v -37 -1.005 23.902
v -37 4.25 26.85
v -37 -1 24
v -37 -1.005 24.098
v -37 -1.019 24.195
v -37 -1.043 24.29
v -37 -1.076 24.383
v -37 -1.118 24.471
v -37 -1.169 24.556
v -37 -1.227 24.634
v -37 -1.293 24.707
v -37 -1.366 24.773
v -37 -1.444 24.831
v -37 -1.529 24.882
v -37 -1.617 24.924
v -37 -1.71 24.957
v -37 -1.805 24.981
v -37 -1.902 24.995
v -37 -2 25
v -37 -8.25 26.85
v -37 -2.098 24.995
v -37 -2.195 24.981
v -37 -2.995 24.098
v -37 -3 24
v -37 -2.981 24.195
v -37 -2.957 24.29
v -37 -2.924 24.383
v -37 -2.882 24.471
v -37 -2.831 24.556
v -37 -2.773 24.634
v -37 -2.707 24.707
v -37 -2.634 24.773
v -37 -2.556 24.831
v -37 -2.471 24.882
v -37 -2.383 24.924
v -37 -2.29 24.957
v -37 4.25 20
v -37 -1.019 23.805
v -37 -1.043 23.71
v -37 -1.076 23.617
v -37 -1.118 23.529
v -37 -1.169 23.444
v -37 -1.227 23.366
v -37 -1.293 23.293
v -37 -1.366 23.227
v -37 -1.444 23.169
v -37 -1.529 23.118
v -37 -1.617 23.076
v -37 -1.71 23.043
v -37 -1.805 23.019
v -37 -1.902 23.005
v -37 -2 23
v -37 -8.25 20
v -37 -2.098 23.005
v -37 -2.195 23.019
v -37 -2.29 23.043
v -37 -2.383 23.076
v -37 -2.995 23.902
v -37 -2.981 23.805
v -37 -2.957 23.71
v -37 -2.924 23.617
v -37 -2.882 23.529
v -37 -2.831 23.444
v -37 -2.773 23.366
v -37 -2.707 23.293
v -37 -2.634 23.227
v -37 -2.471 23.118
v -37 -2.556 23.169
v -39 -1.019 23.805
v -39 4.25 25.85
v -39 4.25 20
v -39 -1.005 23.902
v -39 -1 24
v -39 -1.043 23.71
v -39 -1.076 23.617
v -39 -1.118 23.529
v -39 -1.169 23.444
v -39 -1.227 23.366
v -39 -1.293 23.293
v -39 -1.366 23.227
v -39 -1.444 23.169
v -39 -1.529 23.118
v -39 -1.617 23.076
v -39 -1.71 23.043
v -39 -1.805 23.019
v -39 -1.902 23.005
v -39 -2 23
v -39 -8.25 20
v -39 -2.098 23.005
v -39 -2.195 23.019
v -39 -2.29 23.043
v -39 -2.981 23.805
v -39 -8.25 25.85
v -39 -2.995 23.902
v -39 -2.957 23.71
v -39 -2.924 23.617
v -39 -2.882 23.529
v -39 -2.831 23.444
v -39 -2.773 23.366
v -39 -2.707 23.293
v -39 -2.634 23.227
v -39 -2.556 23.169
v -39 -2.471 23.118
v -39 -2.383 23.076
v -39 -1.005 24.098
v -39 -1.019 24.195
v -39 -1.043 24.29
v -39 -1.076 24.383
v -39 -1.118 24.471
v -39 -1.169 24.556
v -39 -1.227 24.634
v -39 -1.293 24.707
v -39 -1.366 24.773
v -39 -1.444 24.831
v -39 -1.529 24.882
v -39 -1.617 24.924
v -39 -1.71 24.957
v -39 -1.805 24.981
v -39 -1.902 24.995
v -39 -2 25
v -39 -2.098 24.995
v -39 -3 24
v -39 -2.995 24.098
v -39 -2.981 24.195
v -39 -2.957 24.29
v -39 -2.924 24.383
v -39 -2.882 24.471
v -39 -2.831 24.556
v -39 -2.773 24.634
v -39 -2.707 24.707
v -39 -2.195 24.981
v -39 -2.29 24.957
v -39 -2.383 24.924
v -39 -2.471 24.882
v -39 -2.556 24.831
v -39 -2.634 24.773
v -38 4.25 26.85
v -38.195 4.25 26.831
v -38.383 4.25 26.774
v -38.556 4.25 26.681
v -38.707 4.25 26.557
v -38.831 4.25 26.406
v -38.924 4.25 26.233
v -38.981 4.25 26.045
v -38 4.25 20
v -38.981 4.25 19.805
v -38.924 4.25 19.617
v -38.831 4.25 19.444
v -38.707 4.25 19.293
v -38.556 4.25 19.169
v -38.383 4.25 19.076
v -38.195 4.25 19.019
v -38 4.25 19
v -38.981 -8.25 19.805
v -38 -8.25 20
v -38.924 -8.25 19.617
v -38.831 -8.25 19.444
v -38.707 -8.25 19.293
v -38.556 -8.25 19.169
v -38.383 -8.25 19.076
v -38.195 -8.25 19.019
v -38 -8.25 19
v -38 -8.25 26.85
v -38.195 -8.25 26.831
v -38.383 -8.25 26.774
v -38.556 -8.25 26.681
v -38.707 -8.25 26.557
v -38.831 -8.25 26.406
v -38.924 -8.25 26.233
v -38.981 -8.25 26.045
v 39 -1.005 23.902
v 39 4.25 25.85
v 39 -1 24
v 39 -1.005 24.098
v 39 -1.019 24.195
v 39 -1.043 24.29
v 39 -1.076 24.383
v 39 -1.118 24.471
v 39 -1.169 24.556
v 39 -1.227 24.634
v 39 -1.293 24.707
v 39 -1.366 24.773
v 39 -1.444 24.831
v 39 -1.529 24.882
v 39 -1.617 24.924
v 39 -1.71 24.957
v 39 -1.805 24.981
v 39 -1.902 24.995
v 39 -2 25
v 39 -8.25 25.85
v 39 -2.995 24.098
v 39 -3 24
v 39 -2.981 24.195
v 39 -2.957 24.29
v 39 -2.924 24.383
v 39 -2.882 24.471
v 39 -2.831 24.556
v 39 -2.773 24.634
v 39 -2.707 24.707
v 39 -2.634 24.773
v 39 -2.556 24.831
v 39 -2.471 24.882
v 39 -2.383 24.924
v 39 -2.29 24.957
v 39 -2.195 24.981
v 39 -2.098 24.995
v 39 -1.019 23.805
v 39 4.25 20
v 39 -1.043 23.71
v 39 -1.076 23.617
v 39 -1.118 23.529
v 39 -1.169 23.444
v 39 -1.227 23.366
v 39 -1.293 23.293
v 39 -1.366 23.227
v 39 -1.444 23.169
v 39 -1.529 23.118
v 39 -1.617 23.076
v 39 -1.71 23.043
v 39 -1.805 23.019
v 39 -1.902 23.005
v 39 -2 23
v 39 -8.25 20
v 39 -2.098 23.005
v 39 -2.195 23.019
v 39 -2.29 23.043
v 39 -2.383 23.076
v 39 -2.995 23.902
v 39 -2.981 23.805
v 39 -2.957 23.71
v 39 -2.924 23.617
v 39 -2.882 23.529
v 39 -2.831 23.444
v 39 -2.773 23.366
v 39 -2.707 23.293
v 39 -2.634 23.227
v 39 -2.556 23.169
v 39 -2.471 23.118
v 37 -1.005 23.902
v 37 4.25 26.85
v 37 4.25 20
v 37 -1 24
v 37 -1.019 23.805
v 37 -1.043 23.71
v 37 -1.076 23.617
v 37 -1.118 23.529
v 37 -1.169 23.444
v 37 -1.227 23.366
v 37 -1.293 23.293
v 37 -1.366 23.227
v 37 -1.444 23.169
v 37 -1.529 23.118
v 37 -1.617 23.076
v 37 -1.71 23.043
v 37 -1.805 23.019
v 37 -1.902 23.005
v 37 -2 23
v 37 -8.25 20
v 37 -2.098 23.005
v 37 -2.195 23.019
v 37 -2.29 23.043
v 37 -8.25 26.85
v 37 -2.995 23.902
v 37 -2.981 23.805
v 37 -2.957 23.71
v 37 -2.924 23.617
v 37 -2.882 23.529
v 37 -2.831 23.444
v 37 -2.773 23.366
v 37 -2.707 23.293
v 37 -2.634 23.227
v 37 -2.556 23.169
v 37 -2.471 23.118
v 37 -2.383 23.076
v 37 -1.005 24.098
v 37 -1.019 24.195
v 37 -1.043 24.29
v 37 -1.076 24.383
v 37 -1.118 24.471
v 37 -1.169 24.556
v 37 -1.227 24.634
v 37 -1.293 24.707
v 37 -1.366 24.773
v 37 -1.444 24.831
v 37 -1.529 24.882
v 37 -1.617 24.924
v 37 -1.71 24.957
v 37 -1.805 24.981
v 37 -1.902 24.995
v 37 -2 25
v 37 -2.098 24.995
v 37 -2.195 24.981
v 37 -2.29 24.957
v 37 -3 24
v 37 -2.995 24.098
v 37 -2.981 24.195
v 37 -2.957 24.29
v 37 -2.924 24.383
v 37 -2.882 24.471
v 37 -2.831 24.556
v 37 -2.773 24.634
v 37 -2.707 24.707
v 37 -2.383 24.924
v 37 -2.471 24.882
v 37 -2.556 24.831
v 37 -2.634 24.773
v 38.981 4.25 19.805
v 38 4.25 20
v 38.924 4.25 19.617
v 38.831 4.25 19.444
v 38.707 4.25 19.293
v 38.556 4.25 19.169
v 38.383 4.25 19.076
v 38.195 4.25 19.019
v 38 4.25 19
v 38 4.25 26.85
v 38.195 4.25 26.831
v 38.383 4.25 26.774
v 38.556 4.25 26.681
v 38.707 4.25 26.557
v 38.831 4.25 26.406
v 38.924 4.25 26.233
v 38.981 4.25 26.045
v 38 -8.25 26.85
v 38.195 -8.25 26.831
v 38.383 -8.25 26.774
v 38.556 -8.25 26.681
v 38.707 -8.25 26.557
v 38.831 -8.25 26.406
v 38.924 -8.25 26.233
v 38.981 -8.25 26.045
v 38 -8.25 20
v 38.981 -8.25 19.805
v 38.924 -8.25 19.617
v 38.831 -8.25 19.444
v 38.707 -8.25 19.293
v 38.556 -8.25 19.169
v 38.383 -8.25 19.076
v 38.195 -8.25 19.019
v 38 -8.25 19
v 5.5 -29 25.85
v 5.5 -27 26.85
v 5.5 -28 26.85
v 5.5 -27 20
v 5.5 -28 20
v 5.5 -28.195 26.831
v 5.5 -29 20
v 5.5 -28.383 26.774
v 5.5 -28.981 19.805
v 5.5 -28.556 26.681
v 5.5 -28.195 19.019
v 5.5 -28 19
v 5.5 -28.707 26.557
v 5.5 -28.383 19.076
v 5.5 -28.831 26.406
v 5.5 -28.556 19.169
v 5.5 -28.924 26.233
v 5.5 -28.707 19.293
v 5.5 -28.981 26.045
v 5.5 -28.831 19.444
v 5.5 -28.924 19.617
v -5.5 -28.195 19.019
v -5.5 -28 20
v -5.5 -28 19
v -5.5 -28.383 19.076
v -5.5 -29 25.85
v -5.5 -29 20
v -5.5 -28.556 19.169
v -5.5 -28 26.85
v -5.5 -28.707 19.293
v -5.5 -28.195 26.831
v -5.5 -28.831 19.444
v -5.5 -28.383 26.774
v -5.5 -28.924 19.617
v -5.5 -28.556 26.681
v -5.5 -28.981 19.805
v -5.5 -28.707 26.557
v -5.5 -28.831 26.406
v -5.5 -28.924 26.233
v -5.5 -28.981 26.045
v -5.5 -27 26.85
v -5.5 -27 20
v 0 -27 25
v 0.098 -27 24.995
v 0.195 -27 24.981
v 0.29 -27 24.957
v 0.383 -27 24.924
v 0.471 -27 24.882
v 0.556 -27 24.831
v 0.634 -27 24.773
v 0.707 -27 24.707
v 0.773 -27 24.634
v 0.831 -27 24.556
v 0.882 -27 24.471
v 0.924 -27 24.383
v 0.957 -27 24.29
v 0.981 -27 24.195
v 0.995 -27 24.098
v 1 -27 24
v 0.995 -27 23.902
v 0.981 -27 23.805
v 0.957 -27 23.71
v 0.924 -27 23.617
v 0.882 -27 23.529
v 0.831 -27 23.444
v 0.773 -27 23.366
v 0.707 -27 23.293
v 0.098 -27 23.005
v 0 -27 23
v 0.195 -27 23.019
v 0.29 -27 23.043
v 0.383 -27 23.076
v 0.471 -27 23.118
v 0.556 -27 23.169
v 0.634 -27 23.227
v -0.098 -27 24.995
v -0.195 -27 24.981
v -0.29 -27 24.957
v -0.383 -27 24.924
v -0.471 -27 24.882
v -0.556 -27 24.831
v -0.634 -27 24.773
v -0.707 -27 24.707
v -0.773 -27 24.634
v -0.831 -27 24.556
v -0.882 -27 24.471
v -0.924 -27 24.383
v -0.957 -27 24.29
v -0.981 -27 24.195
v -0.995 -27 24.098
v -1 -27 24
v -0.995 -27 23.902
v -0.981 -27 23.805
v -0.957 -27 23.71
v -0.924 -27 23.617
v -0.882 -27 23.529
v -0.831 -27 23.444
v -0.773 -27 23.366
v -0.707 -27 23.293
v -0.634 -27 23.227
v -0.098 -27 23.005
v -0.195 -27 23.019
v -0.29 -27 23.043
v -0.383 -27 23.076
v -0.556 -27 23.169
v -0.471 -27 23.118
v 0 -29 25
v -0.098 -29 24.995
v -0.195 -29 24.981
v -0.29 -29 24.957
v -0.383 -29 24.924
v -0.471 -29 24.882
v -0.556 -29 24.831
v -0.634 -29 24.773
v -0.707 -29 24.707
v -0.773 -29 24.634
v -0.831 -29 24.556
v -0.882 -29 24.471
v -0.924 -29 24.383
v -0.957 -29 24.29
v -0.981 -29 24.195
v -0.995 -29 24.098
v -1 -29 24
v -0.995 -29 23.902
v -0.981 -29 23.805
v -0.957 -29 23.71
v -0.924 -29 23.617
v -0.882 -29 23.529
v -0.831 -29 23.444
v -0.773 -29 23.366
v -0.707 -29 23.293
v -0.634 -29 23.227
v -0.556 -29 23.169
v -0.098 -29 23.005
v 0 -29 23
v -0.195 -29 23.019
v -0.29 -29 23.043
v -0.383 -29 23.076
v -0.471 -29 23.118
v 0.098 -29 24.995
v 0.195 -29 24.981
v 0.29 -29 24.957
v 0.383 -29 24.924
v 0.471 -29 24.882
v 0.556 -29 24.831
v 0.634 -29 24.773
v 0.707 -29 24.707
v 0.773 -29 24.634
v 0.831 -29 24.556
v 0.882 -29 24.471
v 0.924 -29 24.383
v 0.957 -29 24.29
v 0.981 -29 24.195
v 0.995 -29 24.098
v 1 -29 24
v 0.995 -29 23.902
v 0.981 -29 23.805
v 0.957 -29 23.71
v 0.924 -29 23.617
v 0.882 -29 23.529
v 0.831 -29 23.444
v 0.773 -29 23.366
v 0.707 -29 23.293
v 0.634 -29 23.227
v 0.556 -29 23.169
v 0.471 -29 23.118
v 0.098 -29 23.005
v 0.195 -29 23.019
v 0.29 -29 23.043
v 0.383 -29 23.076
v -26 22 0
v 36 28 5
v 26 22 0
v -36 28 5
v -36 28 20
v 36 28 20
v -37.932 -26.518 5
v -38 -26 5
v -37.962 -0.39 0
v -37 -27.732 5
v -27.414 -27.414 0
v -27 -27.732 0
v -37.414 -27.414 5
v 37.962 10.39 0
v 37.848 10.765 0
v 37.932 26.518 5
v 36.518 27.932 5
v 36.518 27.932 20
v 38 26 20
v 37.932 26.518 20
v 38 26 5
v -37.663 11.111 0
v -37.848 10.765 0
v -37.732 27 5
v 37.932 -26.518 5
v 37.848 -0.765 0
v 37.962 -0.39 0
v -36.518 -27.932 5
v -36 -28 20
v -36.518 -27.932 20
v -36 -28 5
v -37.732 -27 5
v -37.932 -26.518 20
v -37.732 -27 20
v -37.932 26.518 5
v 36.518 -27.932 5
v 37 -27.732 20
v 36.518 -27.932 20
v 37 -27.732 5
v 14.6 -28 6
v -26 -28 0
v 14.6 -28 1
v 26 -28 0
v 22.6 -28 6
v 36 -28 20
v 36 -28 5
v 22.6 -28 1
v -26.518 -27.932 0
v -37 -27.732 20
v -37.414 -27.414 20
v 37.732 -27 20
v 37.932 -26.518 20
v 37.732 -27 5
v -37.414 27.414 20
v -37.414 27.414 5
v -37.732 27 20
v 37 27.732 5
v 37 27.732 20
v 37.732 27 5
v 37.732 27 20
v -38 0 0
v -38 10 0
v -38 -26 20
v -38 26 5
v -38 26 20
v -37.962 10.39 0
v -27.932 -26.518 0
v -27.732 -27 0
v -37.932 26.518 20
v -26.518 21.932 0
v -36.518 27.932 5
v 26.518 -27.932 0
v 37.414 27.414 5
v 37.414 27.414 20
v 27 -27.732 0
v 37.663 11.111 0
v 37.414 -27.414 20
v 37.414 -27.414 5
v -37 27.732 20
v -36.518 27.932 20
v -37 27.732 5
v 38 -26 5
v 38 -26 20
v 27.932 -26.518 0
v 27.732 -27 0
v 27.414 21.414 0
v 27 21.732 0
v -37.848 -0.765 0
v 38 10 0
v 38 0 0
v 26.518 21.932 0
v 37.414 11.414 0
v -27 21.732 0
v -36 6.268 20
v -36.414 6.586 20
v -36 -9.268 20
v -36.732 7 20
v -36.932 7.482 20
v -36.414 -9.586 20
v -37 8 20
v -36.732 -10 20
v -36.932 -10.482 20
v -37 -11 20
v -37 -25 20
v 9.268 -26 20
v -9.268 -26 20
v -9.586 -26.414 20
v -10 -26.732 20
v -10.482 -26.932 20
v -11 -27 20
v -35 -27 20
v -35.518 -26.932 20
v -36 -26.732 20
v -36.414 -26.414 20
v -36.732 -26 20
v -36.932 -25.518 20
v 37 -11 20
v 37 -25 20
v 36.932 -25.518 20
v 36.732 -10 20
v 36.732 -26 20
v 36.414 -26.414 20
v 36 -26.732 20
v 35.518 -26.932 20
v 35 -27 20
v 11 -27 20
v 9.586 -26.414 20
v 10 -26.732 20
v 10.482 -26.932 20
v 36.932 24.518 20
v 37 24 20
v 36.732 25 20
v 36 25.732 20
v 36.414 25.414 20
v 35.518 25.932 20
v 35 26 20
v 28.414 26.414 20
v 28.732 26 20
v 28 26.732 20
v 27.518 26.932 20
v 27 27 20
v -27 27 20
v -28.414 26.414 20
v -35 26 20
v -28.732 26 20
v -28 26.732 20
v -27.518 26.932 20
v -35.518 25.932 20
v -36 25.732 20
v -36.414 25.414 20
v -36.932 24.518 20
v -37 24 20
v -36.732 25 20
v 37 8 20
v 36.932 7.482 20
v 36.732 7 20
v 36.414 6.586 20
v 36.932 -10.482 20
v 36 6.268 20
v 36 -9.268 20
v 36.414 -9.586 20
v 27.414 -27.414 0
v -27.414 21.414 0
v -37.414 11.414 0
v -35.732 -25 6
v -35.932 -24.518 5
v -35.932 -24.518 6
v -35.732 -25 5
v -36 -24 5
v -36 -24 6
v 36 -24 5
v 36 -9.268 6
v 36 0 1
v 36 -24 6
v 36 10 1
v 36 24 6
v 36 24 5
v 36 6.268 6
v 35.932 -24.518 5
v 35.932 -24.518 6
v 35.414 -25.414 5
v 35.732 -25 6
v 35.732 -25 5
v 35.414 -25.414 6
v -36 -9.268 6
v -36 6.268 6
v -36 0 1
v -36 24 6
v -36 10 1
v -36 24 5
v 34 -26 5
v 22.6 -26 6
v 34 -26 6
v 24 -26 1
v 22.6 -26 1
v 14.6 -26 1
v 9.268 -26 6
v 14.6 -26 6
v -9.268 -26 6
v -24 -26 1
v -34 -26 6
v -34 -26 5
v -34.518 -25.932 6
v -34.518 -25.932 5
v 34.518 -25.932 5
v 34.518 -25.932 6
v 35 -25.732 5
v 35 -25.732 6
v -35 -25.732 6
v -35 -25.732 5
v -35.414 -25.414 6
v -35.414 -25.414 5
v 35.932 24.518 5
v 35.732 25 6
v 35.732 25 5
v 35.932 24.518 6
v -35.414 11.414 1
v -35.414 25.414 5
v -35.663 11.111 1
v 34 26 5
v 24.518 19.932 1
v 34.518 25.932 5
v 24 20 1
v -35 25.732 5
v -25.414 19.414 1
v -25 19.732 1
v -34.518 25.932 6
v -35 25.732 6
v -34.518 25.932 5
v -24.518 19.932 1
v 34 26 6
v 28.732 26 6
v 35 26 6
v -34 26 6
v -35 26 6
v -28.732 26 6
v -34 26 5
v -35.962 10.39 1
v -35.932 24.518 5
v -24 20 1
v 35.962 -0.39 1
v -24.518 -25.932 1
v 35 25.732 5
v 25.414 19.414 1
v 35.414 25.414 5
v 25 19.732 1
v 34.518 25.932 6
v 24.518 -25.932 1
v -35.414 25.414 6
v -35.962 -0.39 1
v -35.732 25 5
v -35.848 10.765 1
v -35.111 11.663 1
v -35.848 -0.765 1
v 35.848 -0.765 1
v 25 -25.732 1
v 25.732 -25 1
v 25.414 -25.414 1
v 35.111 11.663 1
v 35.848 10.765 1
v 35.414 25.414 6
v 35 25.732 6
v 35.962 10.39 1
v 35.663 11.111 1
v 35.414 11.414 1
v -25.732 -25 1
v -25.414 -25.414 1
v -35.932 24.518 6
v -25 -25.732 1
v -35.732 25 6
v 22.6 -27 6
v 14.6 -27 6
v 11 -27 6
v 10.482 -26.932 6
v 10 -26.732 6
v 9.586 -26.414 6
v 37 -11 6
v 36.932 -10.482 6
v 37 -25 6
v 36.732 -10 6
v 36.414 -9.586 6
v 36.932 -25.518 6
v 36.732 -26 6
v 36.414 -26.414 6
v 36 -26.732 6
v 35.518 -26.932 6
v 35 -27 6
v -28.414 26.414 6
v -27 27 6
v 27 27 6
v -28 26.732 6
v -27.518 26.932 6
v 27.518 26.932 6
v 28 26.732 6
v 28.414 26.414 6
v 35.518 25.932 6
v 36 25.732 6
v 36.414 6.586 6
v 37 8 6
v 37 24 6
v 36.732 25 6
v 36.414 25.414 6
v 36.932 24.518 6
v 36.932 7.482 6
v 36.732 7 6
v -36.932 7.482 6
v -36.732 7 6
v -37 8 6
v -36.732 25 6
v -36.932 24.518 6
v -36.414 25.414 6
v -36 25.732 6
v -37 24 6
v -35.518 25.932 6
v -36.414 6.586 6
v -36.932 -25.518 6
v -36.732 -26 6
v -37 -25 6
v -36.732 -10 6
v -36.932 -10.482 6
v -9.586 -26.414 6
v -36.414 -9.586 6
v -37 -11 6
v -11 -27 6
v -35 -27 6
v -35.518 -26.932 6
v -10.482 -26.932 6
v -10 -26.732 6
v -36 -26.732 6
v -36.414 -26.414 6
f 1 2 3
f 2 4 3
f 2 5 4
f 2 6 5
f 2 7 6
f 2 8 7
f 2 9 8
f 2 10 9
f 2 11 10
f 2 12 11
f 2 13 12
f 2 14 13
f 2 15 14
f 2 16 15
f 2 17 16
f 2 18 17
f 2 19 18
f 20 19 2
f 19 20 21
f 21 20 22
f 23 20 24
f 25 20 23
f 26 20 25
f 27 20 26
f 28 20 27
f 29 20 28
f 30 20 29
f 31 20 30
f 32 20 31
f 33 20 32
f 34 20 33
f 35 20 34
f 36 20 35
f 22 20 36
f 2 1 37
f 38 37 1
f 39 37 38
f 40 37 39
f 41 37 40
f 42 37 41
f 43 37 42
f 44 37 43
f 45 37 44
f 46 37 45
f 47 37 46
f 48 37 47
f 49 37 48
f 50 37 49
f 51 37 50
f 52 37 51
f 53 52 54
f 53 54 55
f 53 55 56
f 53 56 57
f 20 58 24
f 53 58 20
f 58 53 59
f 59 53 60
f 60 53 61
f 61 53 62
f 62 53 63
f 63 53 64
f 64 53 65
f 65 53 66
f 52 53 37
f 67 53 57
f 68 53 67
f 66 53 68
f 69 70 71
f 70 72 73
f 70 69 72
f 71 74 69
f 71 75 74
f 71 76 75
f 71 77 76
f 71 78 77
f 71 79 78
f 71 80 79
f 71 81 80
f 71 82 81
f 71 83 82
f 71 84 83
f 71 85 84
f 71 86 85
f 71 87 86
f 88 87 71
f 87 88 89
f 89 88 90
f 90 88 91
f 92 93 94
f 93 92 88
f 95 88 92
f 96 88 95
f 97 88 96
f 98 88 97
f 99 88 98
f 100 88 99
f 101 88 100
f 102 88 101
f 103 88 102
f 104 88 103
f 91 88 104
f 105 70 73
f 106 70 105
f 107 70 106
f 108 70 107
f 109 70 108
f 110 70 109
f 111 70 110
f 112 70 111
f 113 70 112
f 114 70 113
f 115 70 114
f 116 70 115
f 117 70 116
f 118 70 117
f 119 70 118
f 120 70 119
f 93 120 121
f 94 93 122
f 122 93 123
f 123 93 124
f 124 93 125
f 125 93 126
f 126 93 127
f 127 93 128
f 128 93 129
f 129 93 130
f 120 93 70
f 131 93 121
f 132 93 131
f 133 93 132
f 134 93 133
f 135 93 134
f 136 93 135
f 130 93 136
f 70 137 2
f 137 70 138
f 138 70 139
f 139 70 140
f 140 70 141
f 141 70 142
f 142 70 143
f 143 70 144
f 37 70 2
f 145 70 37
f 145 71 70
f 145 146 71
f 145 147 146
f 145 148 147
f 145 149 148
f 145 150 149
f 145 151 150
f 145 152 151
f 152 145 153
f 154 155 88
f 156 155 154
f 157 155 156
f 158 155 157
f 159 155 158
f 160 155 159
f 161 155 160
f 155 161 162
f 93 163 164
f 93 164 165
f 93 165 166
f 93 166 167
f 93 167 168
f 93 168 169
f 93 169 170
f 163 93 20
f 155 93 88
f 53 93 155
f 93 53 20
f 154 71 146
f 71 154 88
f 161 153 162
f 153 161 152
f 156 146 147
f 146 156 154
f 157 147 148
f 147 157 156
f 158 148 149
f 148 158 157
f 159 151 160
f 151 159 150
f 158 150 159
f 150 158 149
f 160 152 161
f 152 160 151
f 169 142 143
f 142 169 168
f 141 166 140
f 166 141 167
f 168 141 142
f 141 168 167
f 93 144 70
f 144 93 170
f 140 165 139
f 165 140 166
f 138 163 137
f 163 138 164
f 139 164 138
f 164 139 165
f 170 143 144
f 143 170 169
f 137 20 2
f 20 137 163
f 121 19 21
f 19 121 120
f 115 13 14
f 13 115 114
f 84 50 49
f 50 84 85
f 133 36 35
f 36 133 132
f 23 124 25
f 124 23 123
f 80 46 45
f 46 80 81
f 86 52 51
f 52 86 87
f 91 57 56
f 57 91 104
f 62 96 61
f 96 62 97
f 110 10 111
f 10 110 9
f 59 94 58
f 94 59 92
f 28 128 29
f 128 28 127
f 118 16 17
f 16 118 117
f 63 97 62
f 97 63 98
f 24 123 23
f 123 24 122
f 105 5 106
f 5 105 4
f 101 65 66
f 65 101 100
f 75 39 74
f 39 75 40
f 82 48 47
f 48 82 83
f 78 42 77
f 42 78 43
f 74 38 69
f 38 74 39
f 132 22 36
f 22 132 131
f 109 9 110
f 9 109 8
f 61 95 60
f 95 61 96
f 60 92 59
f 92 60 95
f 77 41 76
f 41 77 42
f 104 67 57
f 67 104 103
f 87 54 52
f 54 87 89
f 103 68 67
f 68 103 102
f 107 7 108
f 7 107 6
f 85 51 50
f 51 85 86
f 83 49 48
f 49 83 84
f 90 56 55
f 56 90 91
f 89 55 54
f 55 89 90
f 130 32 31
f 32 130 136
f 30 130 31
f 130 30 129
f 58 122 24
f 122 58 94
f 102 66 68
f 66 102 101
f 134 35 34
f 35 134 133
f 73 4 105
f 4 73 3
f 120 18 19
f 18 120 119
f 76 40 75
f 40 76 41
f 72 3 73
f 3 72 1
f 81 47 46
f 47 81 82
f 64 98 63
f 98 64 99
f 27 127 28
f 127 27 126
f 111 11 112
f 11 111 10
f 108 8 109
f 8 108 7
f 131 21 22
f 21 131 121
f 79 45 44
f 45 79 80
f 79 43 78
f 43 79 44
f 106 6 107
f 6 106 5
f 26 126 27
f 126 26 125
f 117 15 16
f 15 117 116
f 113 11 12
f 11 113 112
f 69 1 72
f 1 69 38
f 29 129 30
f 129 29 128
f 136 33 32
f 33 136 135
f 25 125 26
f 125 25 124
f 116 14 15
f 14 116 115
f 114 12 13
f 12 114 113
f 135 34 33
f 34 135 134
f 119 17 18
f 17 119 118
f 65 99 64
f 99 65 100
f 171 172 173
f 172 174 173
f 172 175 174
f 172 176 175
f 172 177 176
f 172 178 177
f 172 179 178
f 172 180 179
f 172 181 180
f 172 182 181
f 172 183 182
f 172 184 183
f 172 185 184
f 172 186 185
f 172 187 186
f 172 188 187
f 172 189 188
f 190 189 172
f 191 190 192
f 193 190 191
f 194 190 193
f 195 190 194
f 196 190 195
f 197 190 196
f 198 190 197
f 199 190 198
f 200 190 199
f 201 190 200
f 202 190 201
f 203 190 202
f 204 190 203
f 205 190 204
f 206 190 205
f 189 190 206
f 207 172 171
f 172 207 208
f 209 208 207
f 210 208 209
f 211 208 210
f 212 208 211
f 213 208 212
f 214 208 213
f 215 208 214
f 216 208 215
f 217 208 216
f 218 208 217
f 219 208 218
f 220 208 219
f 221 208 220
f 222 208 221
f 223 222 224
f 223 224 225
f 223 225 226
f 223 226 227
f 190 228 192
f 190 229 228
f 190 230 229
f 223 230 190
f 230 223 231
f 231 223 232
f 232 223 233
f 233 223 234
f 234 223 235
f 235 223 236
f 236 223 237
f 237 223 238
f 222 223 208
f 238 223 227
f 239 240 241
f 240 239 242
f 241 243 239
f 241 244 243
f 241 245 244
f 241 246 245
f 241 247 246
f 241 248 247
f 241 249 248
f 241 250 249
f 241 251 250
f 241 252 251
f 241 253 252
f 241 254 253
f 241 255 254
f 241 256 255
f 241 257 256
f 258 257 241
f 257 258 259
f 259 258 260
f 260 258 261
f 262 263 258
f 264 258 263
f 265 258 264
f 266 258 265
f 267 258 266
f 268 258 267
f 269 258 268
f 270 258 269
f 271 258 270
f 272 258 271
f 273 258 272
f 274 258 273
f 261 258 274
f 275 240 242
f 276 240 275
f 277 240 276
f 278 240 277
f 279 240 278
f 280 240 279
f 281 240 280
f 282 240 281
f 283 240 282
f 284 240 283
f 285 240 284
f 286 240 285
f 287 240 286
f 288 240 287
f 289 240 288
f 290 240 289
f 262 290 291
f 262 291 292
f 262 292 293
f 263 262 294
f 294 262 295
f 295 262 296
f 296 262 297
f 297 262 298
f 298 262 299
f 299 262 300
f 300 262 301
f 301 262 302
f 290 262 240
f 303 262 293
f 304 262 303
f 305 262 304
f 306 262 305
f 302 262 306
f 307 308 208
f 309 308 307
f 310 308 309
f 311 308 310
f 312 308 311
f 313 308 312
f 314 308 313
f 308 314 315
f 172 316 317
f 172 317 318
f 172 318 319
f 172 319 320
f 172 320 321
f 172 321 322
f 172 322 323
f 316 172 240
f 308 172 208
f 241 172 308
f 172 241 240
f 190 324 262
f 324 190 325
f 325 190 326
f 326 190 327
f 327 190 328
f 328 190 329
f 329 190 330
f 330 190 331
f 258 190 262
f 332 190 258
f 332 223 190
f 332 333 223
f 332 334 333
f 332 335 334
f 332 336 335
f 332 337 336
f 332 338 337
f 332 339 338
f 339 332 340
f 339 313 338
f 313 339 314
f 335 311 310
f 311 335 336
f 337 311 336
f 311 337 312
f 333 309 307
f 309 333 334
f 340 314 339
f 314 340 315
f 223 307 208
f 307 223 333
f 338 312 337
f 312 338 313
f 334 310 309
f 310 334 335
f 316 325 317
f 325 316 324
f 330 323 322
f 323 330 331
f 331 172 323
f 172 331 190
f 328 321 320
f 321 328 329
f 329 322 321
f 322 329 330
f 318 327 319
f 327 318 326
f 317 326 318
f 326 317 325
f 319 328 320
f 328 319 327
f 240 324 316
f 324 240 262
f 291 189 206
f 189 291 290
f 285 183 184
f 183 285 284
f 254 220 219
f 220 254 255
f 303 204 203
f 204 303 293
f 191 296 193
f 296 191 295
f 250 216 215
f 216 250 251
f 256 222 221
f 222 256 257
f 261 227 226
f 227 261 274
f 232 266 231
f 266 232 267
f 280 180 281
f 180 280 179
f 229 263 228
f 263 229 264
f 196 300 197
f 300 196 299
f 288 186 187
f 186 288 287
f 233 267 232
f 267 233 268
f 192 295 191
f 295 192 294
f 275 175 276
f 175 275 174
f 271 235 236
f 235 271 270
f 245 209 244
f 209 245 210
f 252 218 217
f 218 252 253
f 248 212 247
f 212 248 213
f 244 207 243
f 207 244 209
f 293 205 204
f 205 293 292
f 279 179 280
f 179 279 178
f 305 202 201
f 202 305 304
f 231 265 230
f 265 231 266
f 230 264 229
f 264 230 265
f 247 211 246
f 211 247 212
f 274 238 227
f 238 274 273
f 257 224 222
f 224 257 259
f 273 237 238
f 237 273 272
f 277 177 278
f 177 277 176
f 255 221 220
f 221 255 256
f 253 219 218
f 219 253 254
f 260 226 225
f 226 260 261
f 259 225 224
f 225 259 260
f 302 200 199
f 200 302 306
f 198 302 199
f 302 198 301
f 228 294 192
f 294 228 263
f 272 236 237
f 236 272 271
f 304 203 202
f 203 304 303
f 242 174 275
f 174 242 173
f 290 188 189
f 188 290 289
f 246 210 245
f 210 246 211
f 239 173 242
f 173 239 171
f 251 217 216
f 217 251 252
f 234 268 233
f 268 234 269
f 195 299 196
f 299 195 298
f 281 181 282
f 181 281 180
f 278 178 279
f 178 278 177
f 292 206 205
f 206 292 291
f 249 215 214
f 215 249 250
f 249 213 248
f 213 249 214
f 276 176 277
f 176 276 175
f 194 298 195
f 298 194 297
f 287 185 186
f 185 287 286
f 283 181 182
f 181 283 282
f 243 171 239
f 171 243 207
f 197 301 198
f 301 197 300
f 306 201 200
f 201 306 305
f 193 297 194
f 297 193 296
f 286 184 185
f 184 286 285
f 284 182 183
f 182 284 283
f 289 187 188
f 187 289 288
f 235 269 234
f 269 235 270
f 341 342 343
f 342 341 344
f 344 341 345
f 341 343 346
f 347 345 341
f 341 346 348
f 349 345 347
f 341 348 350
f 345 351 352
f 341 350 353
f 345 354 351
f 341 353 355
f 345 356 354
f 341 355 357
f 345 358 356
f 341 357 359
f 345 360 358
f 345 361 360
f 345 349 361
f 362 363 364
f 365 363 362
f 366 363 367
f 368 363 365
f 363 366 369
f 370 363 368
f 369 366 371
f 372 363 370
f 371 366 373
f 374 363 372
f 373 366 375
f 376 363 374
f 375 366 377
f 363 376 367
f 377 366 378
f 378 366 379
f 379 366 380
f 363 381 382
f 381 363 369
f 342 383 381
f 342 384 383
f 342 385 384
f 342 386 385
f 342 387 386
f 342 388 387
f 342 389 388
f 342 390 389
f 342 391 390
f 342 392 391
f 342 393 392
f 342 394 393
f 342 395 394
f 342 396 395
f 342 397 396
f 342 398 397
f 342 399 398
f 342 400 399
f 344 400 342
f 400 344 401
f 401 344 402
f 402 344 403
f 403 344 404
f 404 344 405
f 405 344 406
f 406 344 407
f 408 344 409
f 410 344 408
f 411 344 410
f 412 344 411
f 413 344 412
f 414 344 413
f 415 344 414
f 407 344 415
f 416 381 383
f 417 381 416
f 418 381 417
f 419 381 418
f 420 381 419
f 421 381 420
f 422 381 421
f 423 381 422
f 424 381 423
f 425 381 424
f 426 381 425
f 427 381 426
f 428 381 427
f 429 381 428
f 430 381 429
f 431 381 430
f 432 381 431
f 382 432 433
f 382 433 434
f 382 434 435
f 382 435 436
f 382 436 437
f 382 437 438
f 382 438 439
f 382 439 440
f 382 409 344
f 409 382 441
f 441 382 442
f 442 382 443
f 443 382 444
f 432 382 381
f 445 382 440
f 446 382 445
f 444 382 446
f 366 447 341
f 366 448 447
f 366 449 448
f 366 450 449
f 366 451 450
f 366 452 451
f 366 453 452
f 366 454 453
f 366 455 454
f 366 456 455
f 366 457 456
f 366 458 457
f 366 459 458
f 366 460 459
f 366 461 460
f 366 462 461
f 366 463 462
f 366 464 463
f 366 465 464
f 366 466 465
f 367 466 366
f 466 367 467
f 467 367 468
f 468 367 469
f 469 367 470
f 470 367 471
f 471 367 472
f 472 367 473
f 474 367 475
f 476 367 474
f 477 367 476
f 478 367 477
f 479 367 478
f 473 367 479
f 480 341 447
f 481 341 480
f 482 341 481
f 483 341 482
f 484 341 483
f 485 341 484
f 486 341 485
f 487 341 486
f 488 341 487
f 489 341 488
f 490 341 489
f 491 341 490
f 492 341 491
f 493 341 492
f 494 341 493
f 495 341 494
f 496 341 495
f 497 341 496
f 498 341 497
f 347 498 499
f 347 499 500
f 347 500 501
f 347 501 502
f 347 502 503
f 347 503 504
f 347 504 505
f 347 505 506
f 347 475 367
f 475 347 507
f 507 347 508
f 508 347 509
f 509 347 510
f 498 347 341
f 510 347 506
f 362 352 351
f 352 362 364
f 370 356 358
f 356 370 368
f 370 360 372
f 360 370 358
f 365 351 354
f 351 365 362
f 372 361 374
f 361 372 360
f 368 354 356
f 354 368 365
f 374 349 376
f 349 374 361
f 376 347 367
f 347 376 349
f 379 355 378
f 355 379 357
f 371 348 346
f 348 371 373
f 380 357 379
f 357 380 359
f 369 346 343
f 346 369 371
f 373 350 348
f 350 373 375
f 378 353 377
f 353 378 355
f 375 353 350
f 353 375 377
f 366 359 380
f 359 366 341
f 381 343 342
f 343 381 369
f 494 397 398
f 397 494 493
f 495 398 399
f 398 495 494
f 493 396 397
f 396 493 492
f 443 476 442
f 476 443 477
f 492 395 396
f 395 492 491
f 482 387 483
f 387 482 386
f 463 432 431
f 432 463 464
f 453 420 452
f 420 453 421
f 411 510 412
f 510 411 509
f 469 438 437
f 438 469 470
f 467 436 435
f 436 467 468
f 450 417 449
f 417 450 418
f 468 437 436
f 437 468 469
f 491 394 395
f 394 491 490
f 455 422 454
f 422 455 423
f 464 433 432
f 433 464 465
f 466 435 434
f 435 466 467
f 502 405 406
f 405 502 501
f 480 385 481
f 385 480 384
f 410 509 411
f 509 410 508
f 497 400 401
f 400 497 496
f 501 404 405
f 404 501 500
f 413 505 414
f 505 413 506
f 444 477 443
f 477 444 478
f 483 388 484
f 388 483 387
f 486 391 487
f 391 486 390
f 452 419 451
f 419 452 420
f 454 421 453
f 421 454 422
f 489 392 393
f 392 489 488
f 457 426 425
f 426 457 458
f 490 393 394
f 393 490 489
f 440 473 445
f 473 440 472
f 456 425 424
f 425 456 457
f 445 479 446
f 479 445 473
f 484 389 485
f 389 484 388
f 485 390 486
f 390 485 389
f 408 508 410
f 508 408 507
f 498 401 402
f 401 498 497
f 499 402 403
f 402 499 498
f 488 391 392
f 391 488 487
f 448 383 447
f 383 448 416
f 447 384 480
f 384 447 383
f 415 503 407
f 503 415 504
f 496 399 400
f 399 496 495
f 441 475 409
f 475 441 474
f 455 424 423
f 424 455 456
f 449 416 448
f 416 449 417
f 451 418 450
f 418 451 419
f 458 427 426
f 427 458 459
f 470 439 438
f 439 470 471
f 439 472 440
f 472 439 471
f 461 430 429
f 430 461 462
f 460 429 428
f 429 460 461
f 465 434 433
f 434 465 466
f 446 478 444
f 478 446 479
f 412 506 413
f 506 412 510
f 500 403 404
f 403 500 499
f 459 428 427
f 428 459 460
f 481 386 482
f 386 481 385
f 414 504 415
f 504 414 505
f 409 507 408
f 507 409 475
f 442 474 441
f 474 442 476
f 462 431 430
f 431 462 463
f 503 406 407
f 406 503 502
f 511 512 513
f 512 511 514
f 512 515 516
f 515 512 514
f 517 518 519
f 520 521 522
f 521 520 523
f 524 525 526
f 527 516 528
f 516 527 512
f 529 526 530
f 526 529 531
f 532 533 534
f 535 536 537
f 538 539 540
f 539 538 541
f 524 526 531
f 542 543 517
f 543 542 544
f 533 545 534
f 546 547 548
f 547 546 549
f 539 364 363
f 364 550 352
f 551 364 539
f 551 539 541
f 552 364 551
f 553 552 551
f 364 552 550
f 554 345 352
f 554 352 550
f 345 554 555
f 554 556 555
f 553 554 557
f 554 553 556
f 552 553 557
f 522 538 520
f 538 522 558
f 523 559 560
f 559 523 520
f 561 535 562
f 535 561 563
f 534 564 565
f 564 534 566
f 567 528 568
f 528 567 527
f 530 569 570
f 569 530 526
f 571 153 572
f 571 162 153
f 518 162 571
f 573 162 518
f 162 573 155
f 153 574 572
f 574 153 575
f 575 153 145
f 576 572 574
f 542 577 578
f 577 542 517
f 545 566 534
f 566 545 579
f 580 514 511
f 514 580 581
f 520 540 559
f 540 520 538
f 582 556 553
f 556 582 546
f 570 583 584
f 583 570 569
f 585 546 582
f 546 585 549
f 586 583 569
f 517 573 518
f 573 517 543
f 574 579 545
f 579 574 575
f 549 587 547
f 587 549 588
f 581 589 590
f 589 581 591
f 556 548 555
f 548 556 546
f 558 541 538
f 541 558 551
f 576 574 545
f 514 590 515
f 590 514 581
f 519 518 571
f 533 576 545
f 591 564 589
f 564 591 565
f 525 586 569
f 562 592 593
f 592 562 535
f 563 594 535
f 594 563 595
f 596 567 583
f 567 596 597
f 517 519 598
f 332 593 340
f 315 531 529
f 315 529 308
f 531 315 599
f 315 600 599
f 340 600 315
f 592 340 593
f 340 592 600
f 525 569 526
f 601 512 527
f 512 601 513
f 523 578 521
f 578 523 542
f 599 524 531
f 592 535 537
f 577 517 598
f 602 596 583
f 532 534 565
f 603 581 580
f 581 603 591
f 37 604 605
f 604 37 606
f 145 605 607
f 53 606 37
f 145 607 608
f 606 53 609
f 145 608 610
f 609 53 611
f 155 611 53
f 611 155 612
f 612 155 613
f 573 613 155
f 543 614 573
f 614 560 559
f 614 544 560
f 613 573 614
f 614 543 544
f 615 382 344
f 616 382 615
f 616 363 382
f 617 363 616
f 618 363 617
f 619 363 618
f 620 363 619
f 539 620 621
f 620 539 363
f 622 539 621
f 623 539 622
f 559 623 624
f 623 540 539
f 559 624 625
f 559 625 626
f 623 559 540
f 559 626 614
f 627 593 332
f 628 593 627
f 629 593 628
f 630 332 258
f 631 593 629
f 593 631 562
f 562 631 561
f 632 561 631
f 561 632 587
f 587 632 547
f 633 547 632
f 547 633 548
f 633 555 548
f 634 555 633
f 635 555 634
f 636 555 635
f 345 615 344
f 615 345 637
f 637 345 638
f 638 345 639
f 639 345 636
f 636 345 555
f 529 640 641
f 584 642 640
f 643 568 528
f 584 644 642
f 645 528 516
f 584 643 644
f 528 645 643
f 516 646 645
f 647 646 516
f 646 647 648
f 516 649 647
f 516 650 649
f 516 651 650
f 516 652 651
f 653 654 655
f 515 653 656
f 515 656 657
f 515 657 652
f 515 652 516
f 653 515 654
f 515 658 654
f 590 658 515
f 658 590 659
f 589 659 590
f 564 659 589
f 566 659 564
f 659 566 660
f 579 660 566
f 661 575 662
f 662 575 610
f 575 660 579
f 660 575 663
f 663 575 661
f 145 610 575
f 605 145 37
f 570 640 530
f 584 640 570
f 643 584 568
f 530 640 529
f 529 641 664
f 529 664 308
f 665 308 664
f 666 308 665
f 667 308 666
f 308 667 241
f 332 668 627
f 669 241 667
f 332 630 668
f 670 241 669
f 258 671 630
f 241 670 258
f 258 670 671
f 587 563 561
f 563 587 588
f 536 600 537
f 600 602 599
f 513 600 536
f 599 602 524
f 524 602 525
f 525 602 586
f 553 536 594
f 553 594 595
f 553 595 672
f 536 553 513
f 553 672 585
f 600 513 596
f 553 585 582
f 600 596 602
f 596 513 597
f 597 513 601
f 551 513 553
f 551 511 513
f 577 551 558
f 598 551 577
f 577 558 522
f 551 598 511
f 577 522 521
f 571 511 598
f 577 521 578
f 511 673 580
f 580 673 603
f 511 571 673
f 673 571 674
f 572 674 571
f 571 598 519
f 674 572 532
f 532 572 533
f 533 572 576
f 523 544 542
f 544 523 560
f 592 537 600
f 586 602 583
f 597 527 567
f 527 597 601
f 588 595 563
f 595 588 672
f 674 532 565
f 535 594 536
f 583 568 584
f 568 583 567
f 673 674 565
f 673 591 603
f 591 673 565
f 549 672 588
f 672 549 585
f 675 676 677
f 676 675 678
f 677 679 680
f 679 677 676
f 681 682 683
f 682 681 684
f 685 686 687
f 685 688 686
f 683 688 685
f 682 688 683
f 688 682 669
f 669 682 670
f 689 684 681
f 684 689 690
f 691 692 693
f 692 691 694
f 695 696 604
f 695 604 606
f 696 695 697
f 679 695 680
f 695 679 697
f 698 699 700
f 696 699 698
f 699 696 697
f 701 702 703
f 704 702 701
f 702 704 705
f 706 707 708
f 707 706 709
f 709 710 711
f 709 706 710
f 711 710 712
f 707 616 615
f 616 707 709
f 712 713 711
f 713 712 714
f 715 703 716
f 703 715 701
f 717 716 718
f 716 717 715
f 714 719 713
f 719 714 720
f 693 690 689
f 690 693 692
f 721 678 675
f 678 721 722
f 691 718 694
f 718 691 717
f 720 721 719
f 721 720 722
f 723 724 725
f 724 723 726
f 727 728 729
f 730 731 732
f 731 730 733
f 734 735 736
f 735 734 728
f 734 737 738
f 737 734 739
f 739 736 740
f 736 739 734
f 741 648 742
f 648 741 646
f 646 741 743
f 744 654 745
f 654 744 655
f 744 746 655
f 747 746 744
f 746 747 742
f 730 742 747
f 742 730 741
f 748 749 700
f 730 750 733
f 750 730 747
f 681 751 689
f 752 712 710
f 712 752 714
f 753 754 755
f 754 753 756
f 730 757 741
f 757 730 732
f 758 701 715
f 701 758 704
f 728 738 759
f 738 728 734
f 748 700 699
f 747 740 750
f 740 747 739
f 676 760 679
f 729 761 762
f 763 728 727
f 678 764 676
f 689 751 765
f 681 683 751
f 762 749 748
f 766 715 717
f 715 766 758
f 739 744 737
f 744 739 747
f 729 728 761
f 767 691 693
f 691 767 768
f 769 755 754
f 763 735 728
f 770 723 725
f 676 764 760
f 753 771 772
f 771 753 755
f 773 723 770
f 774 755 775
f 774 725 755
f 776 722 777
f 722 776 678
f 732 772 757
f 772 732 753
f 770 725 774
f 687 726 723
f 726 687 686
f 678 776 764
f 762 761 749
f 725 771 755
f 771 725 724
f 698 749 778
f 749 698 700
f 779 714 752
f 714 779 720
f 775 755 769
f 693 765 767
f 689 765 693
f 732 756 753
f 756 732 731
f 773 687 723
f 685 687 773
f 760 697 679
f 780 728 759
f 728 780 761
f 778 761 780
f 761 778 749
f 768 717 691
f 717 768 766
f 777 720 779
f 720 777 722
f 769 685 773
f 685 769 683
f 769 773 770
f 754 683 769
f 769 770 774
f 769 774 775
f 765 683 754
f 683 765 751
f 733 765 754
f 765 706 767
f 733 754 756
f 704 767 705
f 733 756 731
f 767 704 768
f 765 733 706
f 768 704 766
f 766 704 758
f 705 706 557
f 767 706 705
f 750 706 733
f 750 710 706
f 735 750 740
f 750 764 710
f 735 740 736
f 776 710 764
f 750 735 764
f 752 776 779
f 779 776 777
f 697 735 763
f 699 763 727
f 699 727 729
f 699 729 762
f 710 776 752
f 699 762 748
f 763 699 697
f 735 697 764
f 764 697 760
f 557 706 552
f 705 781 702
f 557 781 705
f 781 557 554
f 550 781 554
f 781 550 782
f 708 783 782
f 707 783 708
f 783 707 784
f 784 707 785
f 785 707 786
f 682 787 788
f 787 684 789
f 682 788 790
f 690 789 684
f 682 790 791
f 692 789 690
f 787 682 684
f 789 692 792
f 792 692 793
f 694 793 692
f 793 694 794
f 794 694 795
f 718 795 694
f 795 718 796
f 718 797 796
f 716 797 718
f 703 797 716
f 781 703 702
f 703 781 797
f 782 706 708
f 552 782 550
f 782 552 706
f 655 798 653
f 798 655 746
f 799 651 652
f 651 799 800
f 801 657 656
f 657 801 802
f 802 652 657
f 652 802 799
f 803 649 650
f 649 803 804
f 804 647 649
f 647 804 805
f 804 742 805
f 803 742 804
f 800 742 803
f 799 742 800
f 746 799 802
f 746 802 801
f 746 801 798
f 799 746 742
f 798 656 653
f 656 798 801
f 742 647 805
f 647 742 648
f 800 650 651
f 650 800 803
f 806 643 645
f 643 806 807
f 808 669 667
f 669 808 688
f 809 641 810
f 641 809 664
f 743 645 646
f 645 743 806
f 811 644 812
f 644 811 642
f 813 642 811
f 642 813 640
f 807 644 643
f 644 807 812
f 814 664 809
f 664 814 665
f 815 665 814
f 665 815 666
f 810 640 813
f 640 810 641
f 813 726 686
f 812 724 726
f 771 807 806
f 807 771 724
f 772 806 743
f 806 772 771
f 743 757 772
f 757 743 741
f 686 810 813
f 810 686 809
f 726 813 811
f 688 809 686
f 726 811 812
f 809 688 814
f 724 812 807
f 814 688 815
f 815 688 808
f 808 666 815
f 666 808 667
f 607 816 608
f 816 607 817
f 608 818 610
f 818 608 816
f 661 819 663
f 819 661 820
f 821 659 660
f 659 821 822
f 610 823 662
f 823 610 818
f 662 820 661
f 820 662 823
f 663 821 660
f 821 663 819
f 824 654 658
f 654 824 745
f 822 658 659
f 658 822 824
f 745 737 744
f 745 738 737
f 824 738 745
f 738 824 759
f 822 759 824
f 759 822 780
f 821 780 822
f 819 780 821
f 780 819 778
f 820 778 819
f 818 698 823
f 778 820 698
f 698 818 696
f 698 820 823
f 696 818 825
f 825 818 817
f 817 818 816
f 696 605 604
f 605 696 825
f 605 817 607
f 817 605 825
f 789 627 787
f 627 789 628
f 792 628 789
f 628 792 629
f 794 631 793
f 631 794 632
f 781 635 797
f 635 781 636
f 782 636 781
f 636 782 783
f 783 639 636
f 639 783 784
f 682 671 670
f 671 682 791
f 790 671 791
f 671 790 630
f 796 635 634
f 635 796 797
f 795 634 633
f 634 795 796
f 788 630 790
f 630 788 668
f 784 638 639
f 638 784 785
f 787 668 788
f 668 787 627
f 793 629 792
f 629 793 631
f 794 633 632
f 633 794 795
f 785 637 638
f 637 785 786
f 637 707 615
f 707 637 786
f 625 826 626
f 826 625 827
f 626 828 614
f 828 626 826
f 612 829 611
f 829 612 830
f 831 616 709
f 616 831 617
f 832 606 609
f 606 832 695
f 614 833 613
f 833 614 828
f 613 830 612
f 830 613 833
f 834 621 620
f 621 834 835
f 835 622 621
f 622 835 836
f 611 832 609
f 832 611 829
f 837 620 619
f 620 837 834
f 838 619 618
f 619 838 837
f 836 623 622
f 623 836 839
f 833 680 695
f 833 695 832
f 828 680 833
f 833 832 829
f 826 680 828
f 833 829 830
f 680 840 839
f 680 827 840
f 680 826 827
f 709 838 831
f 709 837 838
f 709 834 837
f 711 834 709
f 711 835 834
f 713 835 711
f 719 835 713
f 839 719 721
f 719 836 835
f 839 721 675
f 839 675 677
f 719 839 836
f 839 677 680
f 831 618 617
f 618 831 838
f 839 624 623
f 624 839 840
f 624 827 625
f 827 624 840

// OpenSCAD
// file: config.scad
//Parameters for 12g servo
$fn = 24;
//x,y,z => l,w,h

tap_r = 0.85;
hole_r = 1.0;

servo_l         = 12;  // was 12
servo_w         = 24;  // was 23
body_h          = 20.80;

servo_h         = 27; //not used in code was 27

wing_w          = 4.5;
wing_h          = 2.33;
wing_place      = 16.3;   
hole_offset     = 2.2;    //not checked
mount_hole_r    = 2/2;
mount_slot      = 1;

servo_ww        = servo_w+wing_w*2; // not used in code but is handy number

hub_h           = 4;
small_hub_r     = 6.15/2;  
horn_r          = 4.66/2;
horn_h          = 3;

wire_l          = 4;
wire_w          = 1.5;
wire_h          = 1;
wire_place      = 4.8;

servo_full_w    = servo_w+wing_w*2;

rad = 2;




//Parameters for 5g servo

servo5_l         = 8.6; 
servo5_w         = 18.6; 
body5_h          = 14.65;


hub5_h = 2.15;
small_hub5_r = 4.6/2;  
horn5_r = 4.66/2;
horn5_h = 3;

servo5_h         = body5_h+hub5_h+horn5_h;

mount_x = servo5_l + 2;
mount_y = servo5_w + 2;
mount_round = 1;
servo_tol = 0.2;
servo5_x     = servo5_l + servo_tol*2; //~12
servo5_y     = servo5_w + servo_tol*8; //~23
// file: electronics.scad
$fn=100;

//on_off_switch();

//pi_zero();

//translate ([0,100,0])
//pca9685();

//dc_dc();

//pi_camera();



module header(pins, rows){
  color("darkgrey") cube([2.54*pins,2.54*rows,1.27]);
  
  color("gold")
  for(x=[0:pins-1],y=[0:rows-1])
    translate([x*2.54+(1.27+.6)/2,y*2.54+(1.27+.6)/2,-3.5]) cube([0.6,0.6,11.5]);
}


module pi_zero(){
    // PCB
    color("limegreen") difference(){
        hull(){
            translate([-(65-6)/2,-(30-6)/2,0]) cylinder(r=3, h=1.4 );
            translate([-(65-6)/2, (30-6)/2,0]) cylinder(r=3, h=1.4 );
            translate([ (65-6)/2,-(30-6)/2,0]) cylinder(r=3, h=1.4 );
            translate([ (65-6)/2, (30-6)/2,0]) cylinder(r=3, h=1.4 );
        }
        
        translate([-65/2+3.5,-30/2+3.5,-1]) cylinder(d=2.75, h=3);
        translate([-65/2+3.5, 30/2-3.5,-1]) cylinder(d=2.75, h=3);
        translate([65/2-3.5,-30/2+3.5,-1]) cylinder(d=2.75, h=3);
        translate([65/2-3.5, 30/2-3.5,-1]) cylinder(d=2.75, h=3);
    }
    
    // Header
    translate([-10*2.54,30/2-2.54-3.5,1.4])
    header(20,2);
    
    translate([-65/2,-30/2,1.4]){
        color("silver"){
        
            // micro USB
            translate([41-8/2,-1.5,0]) cube([8,6,2.6]);
            translate([54-8/2,-1.5,0]) cube([8,6,2.6]);        
            
            // HDMI
            translate([6.9,-1.5,0]) cube([13,7,3]);
        }
    
        color("darkgrey"){
        
            // Camera
            translate([64-4/2,7.1,0]) cube([4,16,2.5]);
        }
    
        // Micro SD Card
        color("silver") translate([0,8.6,-0]) cube([13,14,1.5]);    
        color("darkgrey") translate([-2.4,10.1,0]) cube([2.4,11,1]);
    }
}



module pca9685(withHeader=true){  
  
    // PCB
    color("limegreen") difference(){
        translate([0,0,0]) hull(){
            translate([-(62.5-6)/2,-(25.4-6)/2,0]) cylinder(r=3, h=1.4 );
            translate([-(62.5-6)/2, (25.4-6)/2,0]) cylinder(r=3, h=1.4 );
            translate([ (62.5-6)/2,-(25.4-6)/2,0]) cylinder(r=3, h=1.4 );
            translate([ (62.5-6)/2, (25.4-6)/2,0]) cylinder(r=3, h=1.4 );
        }
        
        translate([-55.9/2,-18.8/2,-1]) cylinder(d=2.75, h=3);
        translate([-55.9/2, 18.8/2,-1]) cylinder(d=2.75, h=3);
        translate([55.9/2,-18.8/2,-1]) cylinder(d=2.75, h=3);
        translate([55.9/2, 18.8/2,-1]) cylinder(d=2.75, h=3);
    } 
    
    
    // capacitor
    color("silver")
    translate([-(62.5/2)+17.1,(25.4-8.3)/2,1.4])
    cylinder(d=8.3, h=12.7);
    
    //power connector
    color("blue")
    translate([-(62.5/2)+25.1+2.54*2,(25.4-8.3)/2,1.4])
    cube([2.54*2,4,8]);
    
    // Header top
    translate([-(62.5/2)+5.65,-25.4/2,1.4])
    header(4,3);
    
    translate([2.25,-25.4/2,1.4])
    header(4,3);
    
    translate([-2.25-2.54*4,-25.4/2,1.4])
    header(4,3);
    
    translate([62.5/2-5.65-2.54*4,-25.4/2,1.4])
    header(4,3);
    
    translate([62.5/2,-25.4/2+5.08,1.4])
    rotate([0,0,90])
    header(6,1);
    
    translate([-62.5/2+2.54,-25.4/2+5.08,1.4])
    rotate([0,0,90])
    header(6,1);

  
}

module dc_dc(){
    
    // PCB
    color("limegreen") difference(){
        translate([0,0,0]) hull(){
            translate([-(24.5-6)/2,-(48-6)/2,0]) cylinder(r=3, h=1.4 );
            translate([-(24.5-6)/2, (48-6)/2,0]) cylinder(r=3, h=1.4 );
            translate([ (24.5-6)/2,-(48-6)/2,0]) cylinder(r=3, h=1.4 );
            translate([ (24.5-6)/2, (48-6)/2,0]) cylinder(r=3, h=1.4 );
        }
      
        translate([0,0,-1]) {
            
            //translate([-17/2,-35/2,0])
            //cylinder(d=3.15, h=2.5);
            
            translate([-17/2,35/2, 0])
            cylinder(d=3.15, h=2.5);
            
            translate([17/2,-35/2, 0])
            cylinder(d=3.15, h=2.5);
            
            //translate([17/2,35/2, 0])
            //cylinder(d=3.15, h=2.5); 
          
        }


    } 
    
    
    // capacitors
    color("darkblue")
    translate([-(24.5/2)+12.1,(48-8)/2,1.4])
    cylinder(d=8, h=10);
    
    color("darkblue")
    translate([-(24.5/2)+12.1,-(48-8)/2,1.4])
    cylinder(d=8, h=10);
    
    //toroid
    
    difference(){
        
        color("orange")
        translate([(24.5/2)-22.1+9,(48-30)/2,1.4])
        cylinder(d=12, h=7.6);
        
        color("orange")
        translate([(24.5/2)-22.1+9,(48-30)/2,0.5])
        cylinder(d=6, h=11);

        
    }
    
    
    //potentiometer
    color("blue")
    translate([24.5/2-2,-48/2+9,1.4])
    rotate([0,0,90])
    cube([5,10,11]);
    
    
    //IC
    color("black")
    translate([24.5/2-8,-48/2+15,1.4])
    rotate([0,0,90])
    cube([11,11,5]);
    
    
}


module on_off_switch(){
    
    union(){
        
        color("silver")
        translate([-8/2, -4/2, 0])
        cube([8, 4, 3.8]);
        
        color("black")
        translate([-1.5/2, -1.5/2, 3.8])
        cube([1.5, 1.5, 3]);
        
        color("silver")
        translate([-0.5/2, -0.5/2, -3.2])
        cube([0.5, 0.5, 3.2]);
        
        color("silver")
        translate([-0.5/2-2.5, -0.5/2, -3.2])
        cube([0.5, 0.5, 3.2]);
        
        color("silver")
        translate([-0.5/2+2.5, -0.5/2, -3.2])
        cube([0.5, 0.5, 3.2]);
        
        
        
        
    }
    
}


module pi_camera(){
    difference(){
        union(){
            color("limegreen")
            translate([-25.5/2, -24.5/2, 0])
            cube([25.5, 24.5, 0.9]);
            
            
            //camera sensor
            color("darkgrey")
            translate([-8.5/2, -8.5/2+2.4, 0.9])
            cube([8.5, 8.5, 3.5]);
            
            color("darkgrey")
            translate([0, 2.4, 0.9+3.5])
            cylinder(d=8, h=0.75, $fn=32);
        
            color("darkgrey")
            translate([0, 2.4, 0.9+3.5+0.75])
            cylinder(d=6, h=0.75, $fn=32);
            
            color("darkgrey")
            translate([0, 2.4, 0.9+3.5+0.75+0.75])
            cylinder(d1=2, d2=5, h=2, $fn=32);
            
            //sensor connector
            color("orange")
            translate([-8.5/2, -8.5/2+2.4-10.5, 0.9])
            cube([8.5, 10.5, 2.5]);
            
            //led
            color("white")
            translate([-20/2, -8.5/2+2.4-7, 0.9])
            cube([20, 3, 1]);            
            
            
            //connector
            color("white")
            translate([-20.8/2, -5.5+24/2, -2.4])
            cube([20.8, 5.5, 2.4]);
            
            
    
        }
          
        translate([-21/2,-20/2,-1]) cylinder(d=2.1, h=3);
        translate([-21/2, 20/2-7.5,-1]) cylinder(d=2.1, h=3);
        translate([21/2,-20/2,-1]) cylinder(d=2.1, h=3);
        translate([21/2, 20/2-7.5,-1]) cylinder(d=2.1, h=3);
    }
    
    
}
// file: servo_5g.scad
include <Config.scad>

servo_5g();


$fn = 24;
//x,y,z => l,w,h


module servo_5g() {
  
    translate([-servo5_l/2, -servo5_w/2, -body5_h/2-hub5_h/2-horn5_h/2]) {
    
        color("white") 
        translate([servo5_l/2,servo5_l/2,body5_h+hub5_h])
        cylinder(r=horn5_r,h=horn5_h);
        
        color("deepSkyBlue",.7) //deepSkyBlue
        union() {
            cube([servo5_l,servo5_w,body5_h]);
            translate([servo5_l/2,servo5_l/2,body5_h])
            cylinder(r=servo5_l/2,h=hub5_h);
            translate([servo5_l/2,servo5_l/2+3.7,body5_h])
            cylinder(r=small_hub5_r,h=hub5_h);
            
        }
    }
}
// file: servo_12g.scad
include <config.scad>


servo_12g();


$fn = 24;
//x,y,z => l,w,h


module servo_12g() {
  
    translate([-servo_l/2, -servo_w/2, -body_h/2-hub_h/2-horn_h/2]) {
    
        color("white") 
        translate([servo_l/2,servo_l/2,body_h+hub_h])
        cylinder(r=horn_r,h=horn_h);
        
        color("deepSkyBlue",.7) //deepSkyBlue
        union() {
            cube([servo_l,servo_w,body_h]);
            translate([servo_l/2,servo_l/2,body_h])
            cylinder(r=servo_l/2,h=hub_h);
            translate([servo_l/2,servo_l/2+6.30,body_h])
            cylinder(r=small_hub_r,h=hub_h);
            
        }
    }
}

module roundedRect(size, radius)
{
x = size[0];
y = size[1];
z = size[2];

translate([x/2+radius/2, y/2+radius/2, 0]){
linear_extrude(height=z)
hull()
{
// place 4 circles in the corners, with the given radius
translate([(-x/2)+(radius/2), (-y/2)+(radius/2), 0])
circle(r=radius);

translate([(x/2)-(radius/2), (-y/2)+(radius/2), 0])
circle(r=radius);

translate([(-x/2)+(radius/2), (y/2)-(radius/2), 0])
circle(r=radius);

translate([(x/2)-(radius/2), (y/2)-(radius/2), 0])
circle(r=radius);
}
}
}
// file: Config.scad
//Parameters for 12g servo
$fn = 24;
//x,y,z => l,w,h

tap_r = 0.85;
hole_r = 1.0;

servo_l         = 12;  // was 12
servo_w         = 24;  // was 23
body_h          = 20.80;

servo_h         = 27; //not used in code was 27

wing_w          = 4.5;
wing_h          = 2.33;
wing_place      = 16.3;   
hole_offset     = 2.2;    //not checked
mount_hole_r    = 2/2;
mount_slot      = 1;

servo_ww        = servo_w+wing_w*2; // not used in code but is handy number

hub_h           = 4;
small_hub_r     = 6.15/2;  
horn_r          = 4.66/2;
horn_h          = 3;

wire_l          = 4;
wire_w          = 1.5;
wire_h          = 1;
wire_place      = 4.8;

servo_full_w    = servo_w+wing_w*2;

rad = 2;




//Parameters for 5g servo

servo5_l         = 8.6; 
servo5_w         = 18.6; 
body5_h          = 14.65;


hub5_h = 2.15;
small_hub5_r = 4.6/2;  
horn5_r = 4.66/2;
horn5_h = 3;

servo5_h         = body5_h+hub5_h+horn5_h;

mount_x = servo5_l + 2;
mount_y = servo5_w + 2;
mount_round = 1;
servo_tol = 0.2;
servo5_x     = servo5_l + servo_tol*2; //~12
servo5_y     = servo5_w + servo_tol*8; //~23
// main file
include <Config.scad>
use <servo_12g.scad>
use <servo_5g.scad>
use <electronics.scad>


Citro6_23();


module Citro6_23(){
    
    union(){
    
        difference(){
            
            union(){
                
                hull(){
                
                    translate([-76/2, -56/2, 19])
                    roundedRect([76-rad, 56-rad, 1], rad);
                    
                    translate([-76/2, -56/2, 5])
                    roundedRect([76-rad, 56-rad, 1], rad);
                        
                    translate([-56/2, -50/2-3, 0])
                    roundedRect([56-rad, 50-rad, 1], rad);
                    
                    translate([-72/2, 0, 0])
                    cylinder(r=rad, h=20, $fn=32);
                    
                    translate([72/2, 0, 0])
                    cylinder(r=rad, h=20, $fn=32);

                    translate([-72/2, 10, 0])
                    cylinder(r=rad, h=20, $fn=32);
                    
                    translate([72/2, 10, 0])
                    cylinder(r=rad, h=20, $fn=32);
                    
                    //translate([-74/2, -10, 5])
                    //cylinder(r=rad, h=15, $fn=32);
                    
                    //translate([74/2, -10, 5])
                    //cylinder(r=rad, h=15, $fn=32);

                    
                }
            
                
               
                //right side tab
                translate([-76/2, 0, 10+20/2]) rotate([0, 0, 0]) difference() {
                    union() {
                        
                        translate([-2/2, -12.5/2-2, 0])
                        cube([2, 12.5, 5.85]);
                        
                        translate([0, -2, 0])
                        rotate([90,0,0])
                        cylinder(r=1, h=12.5, $fn=32, center=true);
        
                        translate([0, -2, 5.85])
                        rotate([90,0,0])
                        cylinder(r=1, h=12.5, $fn=32, center=true);  
          
                        translate([0, -12.5/2-2, 0])
                        cube([1, 12.5, 6.85]);              
                    }
                    
                    //translate([1, -14/2-2, 0])
                    //cube([2, 14, 7.85]);
                    
                    translate([0, -2, 4])
                    rotate([0, 90, 0])
                    cylinder(d=2, h=4, center=true, $fn=64);
                    
                }
                
            
            
            
                //left side tab
                translate([76/2, 0, 10+20/2]) rotate([0, 0, 0]) difference() {
                    union() {
                        
                        translate([-2/2, -12.5/2-2, 0])
                        cube([2, 12.5, 5.85]);
                        
                        translate([0, -2, 0])
                        rotate([90,0,0])
                        cylinder(r=1, h=12.5, $fn=32, center=true);
        
                        translate([0, -2, 5.85])
                        rotate([90,0,0])
                        cylinder(r=1, h=12.5, $fn=32, center=true);
                  
                        translate([-1, -12.5/2-2, 0])
                        cube([1, 12.5, 6.85]);      
                        
                    }
                    
                    //translate([-3, -14/2-2, 0])
                    //cube([2, 14, 7.85]);
                    
                    translate([-0, -2, 4])
                    rotate([0, 90, 0])
                    cylinder(d=2, h=4, center=true, $fn=64);
                    
                }
                
                
                //bottom tab
                translate([0, -56/2+2, 10+20/2]) difference(){
                    union(){
                
                        translate([-11/2, -2/2-2, 0])
                        cube([11, 2, 5.85]);
                        
                        translate([0, -2, 0])
                        rotate([0,90,0])
                        cylinder(r=1, h=11, $fn=32, center=true);
        
                        translate([0, -2, 5.85])
                        rotate([0,90,0])
                        cylinder(r=1, h=11, $fn=32, center=true);
                        
                        translate([-11/2, -2, 0])
                        cube([11, 1, 6.85]);
                        
                        
                    }
                    
                    
                //translate([-12.5/2, -1, 0])
                //cube([12.5, 2, 7.85]);
                
                translate([0, -2, 4])
                rotate([90, 0, 0])
                cylinder(d=2, h=4, center=true, $fn=64);
                
                
            }
                
            /**
                //top tab
                translate([0, 56/2+2, 10+20/2]) difference(){
                    union(){
                
                        translate([-73/2, -2/2-2, 0])
                        cube([73, 2, 6.85]);
                        
                        translate([0, -2, 0])
                        rotate([0,90,0])
                        cylinder(r=1, h=73, $fn=32, center=true);
        
                        translate([0, -2, 5.85])
                        rotate([0,90,0])
                        cylinder(r=1, h=73, $fn=32, center=true);
                        
                        translate([-73/2, -2, 0])
                        cube([73, 1, 5.85]);
                        
                        
                    }
                    
                    
                translate([-57/2, -3.1, -1])
                cube([57, 2.2, 8.85]);
                
                //translate([0, -2, 4])
                //rotate([90, 0, 0])
                //#cylinder(d=2, h=4, center=true, $fn=64);
                    
                translate([32.5, -2, 4])
                rotate([90, 0, 0])
                cylinder(d=2, h=4, center=true, $fn=64);
                            
                translate([-32.5, -2, 4])
                rotate([90, 0, 0])
                #cylinder(d=2, h=4, center=true, $fn=64);
                
                
            }
            **/
            
            }
            
            //carveout
                
            translate([-72/2, -52/2 ,6])
            //cube([72, 52, 18.1]);
            roundedRect([72-rad, 51-rad, 19.1], rad);
            
            hull(){
                
                translate([-72/2, -52/2, 19])
                roundedRect([72-rad, 52-rad, 1], rad);
                
                translate([-72/2, -52/2, 5])
                roundedRect([72-rad, 52-rad, 1], rad);
                    
                translate([-52/2, -46/2-3, 1])
                roundedRect([52-rad, 46-rad, 1], rad);
                
                translate([-68/2, 0, 1])
                cylinder(r=rad, h=20, $fn=32);
                
                translate([68/2, 0, 1])
                cylinder(r=rad, h=20, $fn=32);

                translate([-68/2, 10, 1])
                cylinder(r=rad, h=20, $fn=32);
                
                translate([68/2, 10, 1])
                cylinder(r=rad, h=20, $fn=32);
                
                //translate([-70/2, -10, 5])
                //cylinder(r=rad, h=15, $fn=32);
                
                //translate([70/2, -10, 5])
                //cylinder(r=rad, h=15, $fn=32);

            
            }
            
            //hole for the microUSB connector
            translate([-8/2+18.6, -52/2-4 ,1])
            cube([8, 5, 5]);
            
            /**
            //carve out on low tab to allow power card to be flush
            intersection(){
                translate([-22/2, -52/2-2 ,1])
                cube([22, 5, 3]);

                translate([-22/2, -52/2+1 ,-1])
                rotate([60, 0, 0])
                cube([22, 5, 3]);
                   
            }
            **/
            
            //wall thinning for weight reduction
            
            translate([-58/2, 56/2-20-1, 6])
            roundedRect([58-rad, 20-rad, 19.1], rad);
            
            translate([76/2-22-1, 56/2-20-2, 6])
            roundedRect([22-rad, 20-rad, 19.1], rad);
    
            translate([-76/2+1, 56/2-20-2, 6])
            roundedRect([22-rad, 20-rad, 19.1], rad);
            
            translate([76/2-28-1, -56/2+1, 6])
            roundedRect([28-rad, 18-rad, 19.1], rad);
            
            translate([-76/2+1, -56/2+1, 6])
            roundedRect([28-rad, 18-rad, 19.1], rad);
       
            
        }
    
        
        /**
        rotate([-90, 0, 0]) translate([0,0.4,-28]) color("yellow") difference(){
            
            translate([-53.4/2, -5.7/2-5.7/2-0.4, 0])
            roundedRect([53.4-rad+1, 5.7-rad+1, 15], rad-1);
            
            translate([-51.4/2, -3.7/2-2.3/2-2.3, 0])
            #roundedRect([51.4-rad+1, 3.7-rad+1, 18], rad-1);
            
            translate([-49/2, -3/2-3/2-3.3-0.3, -1])
            cube([49, 2.5, 17]);
            //roundedRect([50-rad+1, 2.3-rad+1, 15], rad-1);
            
        }
        **/
        
    }
   
}
